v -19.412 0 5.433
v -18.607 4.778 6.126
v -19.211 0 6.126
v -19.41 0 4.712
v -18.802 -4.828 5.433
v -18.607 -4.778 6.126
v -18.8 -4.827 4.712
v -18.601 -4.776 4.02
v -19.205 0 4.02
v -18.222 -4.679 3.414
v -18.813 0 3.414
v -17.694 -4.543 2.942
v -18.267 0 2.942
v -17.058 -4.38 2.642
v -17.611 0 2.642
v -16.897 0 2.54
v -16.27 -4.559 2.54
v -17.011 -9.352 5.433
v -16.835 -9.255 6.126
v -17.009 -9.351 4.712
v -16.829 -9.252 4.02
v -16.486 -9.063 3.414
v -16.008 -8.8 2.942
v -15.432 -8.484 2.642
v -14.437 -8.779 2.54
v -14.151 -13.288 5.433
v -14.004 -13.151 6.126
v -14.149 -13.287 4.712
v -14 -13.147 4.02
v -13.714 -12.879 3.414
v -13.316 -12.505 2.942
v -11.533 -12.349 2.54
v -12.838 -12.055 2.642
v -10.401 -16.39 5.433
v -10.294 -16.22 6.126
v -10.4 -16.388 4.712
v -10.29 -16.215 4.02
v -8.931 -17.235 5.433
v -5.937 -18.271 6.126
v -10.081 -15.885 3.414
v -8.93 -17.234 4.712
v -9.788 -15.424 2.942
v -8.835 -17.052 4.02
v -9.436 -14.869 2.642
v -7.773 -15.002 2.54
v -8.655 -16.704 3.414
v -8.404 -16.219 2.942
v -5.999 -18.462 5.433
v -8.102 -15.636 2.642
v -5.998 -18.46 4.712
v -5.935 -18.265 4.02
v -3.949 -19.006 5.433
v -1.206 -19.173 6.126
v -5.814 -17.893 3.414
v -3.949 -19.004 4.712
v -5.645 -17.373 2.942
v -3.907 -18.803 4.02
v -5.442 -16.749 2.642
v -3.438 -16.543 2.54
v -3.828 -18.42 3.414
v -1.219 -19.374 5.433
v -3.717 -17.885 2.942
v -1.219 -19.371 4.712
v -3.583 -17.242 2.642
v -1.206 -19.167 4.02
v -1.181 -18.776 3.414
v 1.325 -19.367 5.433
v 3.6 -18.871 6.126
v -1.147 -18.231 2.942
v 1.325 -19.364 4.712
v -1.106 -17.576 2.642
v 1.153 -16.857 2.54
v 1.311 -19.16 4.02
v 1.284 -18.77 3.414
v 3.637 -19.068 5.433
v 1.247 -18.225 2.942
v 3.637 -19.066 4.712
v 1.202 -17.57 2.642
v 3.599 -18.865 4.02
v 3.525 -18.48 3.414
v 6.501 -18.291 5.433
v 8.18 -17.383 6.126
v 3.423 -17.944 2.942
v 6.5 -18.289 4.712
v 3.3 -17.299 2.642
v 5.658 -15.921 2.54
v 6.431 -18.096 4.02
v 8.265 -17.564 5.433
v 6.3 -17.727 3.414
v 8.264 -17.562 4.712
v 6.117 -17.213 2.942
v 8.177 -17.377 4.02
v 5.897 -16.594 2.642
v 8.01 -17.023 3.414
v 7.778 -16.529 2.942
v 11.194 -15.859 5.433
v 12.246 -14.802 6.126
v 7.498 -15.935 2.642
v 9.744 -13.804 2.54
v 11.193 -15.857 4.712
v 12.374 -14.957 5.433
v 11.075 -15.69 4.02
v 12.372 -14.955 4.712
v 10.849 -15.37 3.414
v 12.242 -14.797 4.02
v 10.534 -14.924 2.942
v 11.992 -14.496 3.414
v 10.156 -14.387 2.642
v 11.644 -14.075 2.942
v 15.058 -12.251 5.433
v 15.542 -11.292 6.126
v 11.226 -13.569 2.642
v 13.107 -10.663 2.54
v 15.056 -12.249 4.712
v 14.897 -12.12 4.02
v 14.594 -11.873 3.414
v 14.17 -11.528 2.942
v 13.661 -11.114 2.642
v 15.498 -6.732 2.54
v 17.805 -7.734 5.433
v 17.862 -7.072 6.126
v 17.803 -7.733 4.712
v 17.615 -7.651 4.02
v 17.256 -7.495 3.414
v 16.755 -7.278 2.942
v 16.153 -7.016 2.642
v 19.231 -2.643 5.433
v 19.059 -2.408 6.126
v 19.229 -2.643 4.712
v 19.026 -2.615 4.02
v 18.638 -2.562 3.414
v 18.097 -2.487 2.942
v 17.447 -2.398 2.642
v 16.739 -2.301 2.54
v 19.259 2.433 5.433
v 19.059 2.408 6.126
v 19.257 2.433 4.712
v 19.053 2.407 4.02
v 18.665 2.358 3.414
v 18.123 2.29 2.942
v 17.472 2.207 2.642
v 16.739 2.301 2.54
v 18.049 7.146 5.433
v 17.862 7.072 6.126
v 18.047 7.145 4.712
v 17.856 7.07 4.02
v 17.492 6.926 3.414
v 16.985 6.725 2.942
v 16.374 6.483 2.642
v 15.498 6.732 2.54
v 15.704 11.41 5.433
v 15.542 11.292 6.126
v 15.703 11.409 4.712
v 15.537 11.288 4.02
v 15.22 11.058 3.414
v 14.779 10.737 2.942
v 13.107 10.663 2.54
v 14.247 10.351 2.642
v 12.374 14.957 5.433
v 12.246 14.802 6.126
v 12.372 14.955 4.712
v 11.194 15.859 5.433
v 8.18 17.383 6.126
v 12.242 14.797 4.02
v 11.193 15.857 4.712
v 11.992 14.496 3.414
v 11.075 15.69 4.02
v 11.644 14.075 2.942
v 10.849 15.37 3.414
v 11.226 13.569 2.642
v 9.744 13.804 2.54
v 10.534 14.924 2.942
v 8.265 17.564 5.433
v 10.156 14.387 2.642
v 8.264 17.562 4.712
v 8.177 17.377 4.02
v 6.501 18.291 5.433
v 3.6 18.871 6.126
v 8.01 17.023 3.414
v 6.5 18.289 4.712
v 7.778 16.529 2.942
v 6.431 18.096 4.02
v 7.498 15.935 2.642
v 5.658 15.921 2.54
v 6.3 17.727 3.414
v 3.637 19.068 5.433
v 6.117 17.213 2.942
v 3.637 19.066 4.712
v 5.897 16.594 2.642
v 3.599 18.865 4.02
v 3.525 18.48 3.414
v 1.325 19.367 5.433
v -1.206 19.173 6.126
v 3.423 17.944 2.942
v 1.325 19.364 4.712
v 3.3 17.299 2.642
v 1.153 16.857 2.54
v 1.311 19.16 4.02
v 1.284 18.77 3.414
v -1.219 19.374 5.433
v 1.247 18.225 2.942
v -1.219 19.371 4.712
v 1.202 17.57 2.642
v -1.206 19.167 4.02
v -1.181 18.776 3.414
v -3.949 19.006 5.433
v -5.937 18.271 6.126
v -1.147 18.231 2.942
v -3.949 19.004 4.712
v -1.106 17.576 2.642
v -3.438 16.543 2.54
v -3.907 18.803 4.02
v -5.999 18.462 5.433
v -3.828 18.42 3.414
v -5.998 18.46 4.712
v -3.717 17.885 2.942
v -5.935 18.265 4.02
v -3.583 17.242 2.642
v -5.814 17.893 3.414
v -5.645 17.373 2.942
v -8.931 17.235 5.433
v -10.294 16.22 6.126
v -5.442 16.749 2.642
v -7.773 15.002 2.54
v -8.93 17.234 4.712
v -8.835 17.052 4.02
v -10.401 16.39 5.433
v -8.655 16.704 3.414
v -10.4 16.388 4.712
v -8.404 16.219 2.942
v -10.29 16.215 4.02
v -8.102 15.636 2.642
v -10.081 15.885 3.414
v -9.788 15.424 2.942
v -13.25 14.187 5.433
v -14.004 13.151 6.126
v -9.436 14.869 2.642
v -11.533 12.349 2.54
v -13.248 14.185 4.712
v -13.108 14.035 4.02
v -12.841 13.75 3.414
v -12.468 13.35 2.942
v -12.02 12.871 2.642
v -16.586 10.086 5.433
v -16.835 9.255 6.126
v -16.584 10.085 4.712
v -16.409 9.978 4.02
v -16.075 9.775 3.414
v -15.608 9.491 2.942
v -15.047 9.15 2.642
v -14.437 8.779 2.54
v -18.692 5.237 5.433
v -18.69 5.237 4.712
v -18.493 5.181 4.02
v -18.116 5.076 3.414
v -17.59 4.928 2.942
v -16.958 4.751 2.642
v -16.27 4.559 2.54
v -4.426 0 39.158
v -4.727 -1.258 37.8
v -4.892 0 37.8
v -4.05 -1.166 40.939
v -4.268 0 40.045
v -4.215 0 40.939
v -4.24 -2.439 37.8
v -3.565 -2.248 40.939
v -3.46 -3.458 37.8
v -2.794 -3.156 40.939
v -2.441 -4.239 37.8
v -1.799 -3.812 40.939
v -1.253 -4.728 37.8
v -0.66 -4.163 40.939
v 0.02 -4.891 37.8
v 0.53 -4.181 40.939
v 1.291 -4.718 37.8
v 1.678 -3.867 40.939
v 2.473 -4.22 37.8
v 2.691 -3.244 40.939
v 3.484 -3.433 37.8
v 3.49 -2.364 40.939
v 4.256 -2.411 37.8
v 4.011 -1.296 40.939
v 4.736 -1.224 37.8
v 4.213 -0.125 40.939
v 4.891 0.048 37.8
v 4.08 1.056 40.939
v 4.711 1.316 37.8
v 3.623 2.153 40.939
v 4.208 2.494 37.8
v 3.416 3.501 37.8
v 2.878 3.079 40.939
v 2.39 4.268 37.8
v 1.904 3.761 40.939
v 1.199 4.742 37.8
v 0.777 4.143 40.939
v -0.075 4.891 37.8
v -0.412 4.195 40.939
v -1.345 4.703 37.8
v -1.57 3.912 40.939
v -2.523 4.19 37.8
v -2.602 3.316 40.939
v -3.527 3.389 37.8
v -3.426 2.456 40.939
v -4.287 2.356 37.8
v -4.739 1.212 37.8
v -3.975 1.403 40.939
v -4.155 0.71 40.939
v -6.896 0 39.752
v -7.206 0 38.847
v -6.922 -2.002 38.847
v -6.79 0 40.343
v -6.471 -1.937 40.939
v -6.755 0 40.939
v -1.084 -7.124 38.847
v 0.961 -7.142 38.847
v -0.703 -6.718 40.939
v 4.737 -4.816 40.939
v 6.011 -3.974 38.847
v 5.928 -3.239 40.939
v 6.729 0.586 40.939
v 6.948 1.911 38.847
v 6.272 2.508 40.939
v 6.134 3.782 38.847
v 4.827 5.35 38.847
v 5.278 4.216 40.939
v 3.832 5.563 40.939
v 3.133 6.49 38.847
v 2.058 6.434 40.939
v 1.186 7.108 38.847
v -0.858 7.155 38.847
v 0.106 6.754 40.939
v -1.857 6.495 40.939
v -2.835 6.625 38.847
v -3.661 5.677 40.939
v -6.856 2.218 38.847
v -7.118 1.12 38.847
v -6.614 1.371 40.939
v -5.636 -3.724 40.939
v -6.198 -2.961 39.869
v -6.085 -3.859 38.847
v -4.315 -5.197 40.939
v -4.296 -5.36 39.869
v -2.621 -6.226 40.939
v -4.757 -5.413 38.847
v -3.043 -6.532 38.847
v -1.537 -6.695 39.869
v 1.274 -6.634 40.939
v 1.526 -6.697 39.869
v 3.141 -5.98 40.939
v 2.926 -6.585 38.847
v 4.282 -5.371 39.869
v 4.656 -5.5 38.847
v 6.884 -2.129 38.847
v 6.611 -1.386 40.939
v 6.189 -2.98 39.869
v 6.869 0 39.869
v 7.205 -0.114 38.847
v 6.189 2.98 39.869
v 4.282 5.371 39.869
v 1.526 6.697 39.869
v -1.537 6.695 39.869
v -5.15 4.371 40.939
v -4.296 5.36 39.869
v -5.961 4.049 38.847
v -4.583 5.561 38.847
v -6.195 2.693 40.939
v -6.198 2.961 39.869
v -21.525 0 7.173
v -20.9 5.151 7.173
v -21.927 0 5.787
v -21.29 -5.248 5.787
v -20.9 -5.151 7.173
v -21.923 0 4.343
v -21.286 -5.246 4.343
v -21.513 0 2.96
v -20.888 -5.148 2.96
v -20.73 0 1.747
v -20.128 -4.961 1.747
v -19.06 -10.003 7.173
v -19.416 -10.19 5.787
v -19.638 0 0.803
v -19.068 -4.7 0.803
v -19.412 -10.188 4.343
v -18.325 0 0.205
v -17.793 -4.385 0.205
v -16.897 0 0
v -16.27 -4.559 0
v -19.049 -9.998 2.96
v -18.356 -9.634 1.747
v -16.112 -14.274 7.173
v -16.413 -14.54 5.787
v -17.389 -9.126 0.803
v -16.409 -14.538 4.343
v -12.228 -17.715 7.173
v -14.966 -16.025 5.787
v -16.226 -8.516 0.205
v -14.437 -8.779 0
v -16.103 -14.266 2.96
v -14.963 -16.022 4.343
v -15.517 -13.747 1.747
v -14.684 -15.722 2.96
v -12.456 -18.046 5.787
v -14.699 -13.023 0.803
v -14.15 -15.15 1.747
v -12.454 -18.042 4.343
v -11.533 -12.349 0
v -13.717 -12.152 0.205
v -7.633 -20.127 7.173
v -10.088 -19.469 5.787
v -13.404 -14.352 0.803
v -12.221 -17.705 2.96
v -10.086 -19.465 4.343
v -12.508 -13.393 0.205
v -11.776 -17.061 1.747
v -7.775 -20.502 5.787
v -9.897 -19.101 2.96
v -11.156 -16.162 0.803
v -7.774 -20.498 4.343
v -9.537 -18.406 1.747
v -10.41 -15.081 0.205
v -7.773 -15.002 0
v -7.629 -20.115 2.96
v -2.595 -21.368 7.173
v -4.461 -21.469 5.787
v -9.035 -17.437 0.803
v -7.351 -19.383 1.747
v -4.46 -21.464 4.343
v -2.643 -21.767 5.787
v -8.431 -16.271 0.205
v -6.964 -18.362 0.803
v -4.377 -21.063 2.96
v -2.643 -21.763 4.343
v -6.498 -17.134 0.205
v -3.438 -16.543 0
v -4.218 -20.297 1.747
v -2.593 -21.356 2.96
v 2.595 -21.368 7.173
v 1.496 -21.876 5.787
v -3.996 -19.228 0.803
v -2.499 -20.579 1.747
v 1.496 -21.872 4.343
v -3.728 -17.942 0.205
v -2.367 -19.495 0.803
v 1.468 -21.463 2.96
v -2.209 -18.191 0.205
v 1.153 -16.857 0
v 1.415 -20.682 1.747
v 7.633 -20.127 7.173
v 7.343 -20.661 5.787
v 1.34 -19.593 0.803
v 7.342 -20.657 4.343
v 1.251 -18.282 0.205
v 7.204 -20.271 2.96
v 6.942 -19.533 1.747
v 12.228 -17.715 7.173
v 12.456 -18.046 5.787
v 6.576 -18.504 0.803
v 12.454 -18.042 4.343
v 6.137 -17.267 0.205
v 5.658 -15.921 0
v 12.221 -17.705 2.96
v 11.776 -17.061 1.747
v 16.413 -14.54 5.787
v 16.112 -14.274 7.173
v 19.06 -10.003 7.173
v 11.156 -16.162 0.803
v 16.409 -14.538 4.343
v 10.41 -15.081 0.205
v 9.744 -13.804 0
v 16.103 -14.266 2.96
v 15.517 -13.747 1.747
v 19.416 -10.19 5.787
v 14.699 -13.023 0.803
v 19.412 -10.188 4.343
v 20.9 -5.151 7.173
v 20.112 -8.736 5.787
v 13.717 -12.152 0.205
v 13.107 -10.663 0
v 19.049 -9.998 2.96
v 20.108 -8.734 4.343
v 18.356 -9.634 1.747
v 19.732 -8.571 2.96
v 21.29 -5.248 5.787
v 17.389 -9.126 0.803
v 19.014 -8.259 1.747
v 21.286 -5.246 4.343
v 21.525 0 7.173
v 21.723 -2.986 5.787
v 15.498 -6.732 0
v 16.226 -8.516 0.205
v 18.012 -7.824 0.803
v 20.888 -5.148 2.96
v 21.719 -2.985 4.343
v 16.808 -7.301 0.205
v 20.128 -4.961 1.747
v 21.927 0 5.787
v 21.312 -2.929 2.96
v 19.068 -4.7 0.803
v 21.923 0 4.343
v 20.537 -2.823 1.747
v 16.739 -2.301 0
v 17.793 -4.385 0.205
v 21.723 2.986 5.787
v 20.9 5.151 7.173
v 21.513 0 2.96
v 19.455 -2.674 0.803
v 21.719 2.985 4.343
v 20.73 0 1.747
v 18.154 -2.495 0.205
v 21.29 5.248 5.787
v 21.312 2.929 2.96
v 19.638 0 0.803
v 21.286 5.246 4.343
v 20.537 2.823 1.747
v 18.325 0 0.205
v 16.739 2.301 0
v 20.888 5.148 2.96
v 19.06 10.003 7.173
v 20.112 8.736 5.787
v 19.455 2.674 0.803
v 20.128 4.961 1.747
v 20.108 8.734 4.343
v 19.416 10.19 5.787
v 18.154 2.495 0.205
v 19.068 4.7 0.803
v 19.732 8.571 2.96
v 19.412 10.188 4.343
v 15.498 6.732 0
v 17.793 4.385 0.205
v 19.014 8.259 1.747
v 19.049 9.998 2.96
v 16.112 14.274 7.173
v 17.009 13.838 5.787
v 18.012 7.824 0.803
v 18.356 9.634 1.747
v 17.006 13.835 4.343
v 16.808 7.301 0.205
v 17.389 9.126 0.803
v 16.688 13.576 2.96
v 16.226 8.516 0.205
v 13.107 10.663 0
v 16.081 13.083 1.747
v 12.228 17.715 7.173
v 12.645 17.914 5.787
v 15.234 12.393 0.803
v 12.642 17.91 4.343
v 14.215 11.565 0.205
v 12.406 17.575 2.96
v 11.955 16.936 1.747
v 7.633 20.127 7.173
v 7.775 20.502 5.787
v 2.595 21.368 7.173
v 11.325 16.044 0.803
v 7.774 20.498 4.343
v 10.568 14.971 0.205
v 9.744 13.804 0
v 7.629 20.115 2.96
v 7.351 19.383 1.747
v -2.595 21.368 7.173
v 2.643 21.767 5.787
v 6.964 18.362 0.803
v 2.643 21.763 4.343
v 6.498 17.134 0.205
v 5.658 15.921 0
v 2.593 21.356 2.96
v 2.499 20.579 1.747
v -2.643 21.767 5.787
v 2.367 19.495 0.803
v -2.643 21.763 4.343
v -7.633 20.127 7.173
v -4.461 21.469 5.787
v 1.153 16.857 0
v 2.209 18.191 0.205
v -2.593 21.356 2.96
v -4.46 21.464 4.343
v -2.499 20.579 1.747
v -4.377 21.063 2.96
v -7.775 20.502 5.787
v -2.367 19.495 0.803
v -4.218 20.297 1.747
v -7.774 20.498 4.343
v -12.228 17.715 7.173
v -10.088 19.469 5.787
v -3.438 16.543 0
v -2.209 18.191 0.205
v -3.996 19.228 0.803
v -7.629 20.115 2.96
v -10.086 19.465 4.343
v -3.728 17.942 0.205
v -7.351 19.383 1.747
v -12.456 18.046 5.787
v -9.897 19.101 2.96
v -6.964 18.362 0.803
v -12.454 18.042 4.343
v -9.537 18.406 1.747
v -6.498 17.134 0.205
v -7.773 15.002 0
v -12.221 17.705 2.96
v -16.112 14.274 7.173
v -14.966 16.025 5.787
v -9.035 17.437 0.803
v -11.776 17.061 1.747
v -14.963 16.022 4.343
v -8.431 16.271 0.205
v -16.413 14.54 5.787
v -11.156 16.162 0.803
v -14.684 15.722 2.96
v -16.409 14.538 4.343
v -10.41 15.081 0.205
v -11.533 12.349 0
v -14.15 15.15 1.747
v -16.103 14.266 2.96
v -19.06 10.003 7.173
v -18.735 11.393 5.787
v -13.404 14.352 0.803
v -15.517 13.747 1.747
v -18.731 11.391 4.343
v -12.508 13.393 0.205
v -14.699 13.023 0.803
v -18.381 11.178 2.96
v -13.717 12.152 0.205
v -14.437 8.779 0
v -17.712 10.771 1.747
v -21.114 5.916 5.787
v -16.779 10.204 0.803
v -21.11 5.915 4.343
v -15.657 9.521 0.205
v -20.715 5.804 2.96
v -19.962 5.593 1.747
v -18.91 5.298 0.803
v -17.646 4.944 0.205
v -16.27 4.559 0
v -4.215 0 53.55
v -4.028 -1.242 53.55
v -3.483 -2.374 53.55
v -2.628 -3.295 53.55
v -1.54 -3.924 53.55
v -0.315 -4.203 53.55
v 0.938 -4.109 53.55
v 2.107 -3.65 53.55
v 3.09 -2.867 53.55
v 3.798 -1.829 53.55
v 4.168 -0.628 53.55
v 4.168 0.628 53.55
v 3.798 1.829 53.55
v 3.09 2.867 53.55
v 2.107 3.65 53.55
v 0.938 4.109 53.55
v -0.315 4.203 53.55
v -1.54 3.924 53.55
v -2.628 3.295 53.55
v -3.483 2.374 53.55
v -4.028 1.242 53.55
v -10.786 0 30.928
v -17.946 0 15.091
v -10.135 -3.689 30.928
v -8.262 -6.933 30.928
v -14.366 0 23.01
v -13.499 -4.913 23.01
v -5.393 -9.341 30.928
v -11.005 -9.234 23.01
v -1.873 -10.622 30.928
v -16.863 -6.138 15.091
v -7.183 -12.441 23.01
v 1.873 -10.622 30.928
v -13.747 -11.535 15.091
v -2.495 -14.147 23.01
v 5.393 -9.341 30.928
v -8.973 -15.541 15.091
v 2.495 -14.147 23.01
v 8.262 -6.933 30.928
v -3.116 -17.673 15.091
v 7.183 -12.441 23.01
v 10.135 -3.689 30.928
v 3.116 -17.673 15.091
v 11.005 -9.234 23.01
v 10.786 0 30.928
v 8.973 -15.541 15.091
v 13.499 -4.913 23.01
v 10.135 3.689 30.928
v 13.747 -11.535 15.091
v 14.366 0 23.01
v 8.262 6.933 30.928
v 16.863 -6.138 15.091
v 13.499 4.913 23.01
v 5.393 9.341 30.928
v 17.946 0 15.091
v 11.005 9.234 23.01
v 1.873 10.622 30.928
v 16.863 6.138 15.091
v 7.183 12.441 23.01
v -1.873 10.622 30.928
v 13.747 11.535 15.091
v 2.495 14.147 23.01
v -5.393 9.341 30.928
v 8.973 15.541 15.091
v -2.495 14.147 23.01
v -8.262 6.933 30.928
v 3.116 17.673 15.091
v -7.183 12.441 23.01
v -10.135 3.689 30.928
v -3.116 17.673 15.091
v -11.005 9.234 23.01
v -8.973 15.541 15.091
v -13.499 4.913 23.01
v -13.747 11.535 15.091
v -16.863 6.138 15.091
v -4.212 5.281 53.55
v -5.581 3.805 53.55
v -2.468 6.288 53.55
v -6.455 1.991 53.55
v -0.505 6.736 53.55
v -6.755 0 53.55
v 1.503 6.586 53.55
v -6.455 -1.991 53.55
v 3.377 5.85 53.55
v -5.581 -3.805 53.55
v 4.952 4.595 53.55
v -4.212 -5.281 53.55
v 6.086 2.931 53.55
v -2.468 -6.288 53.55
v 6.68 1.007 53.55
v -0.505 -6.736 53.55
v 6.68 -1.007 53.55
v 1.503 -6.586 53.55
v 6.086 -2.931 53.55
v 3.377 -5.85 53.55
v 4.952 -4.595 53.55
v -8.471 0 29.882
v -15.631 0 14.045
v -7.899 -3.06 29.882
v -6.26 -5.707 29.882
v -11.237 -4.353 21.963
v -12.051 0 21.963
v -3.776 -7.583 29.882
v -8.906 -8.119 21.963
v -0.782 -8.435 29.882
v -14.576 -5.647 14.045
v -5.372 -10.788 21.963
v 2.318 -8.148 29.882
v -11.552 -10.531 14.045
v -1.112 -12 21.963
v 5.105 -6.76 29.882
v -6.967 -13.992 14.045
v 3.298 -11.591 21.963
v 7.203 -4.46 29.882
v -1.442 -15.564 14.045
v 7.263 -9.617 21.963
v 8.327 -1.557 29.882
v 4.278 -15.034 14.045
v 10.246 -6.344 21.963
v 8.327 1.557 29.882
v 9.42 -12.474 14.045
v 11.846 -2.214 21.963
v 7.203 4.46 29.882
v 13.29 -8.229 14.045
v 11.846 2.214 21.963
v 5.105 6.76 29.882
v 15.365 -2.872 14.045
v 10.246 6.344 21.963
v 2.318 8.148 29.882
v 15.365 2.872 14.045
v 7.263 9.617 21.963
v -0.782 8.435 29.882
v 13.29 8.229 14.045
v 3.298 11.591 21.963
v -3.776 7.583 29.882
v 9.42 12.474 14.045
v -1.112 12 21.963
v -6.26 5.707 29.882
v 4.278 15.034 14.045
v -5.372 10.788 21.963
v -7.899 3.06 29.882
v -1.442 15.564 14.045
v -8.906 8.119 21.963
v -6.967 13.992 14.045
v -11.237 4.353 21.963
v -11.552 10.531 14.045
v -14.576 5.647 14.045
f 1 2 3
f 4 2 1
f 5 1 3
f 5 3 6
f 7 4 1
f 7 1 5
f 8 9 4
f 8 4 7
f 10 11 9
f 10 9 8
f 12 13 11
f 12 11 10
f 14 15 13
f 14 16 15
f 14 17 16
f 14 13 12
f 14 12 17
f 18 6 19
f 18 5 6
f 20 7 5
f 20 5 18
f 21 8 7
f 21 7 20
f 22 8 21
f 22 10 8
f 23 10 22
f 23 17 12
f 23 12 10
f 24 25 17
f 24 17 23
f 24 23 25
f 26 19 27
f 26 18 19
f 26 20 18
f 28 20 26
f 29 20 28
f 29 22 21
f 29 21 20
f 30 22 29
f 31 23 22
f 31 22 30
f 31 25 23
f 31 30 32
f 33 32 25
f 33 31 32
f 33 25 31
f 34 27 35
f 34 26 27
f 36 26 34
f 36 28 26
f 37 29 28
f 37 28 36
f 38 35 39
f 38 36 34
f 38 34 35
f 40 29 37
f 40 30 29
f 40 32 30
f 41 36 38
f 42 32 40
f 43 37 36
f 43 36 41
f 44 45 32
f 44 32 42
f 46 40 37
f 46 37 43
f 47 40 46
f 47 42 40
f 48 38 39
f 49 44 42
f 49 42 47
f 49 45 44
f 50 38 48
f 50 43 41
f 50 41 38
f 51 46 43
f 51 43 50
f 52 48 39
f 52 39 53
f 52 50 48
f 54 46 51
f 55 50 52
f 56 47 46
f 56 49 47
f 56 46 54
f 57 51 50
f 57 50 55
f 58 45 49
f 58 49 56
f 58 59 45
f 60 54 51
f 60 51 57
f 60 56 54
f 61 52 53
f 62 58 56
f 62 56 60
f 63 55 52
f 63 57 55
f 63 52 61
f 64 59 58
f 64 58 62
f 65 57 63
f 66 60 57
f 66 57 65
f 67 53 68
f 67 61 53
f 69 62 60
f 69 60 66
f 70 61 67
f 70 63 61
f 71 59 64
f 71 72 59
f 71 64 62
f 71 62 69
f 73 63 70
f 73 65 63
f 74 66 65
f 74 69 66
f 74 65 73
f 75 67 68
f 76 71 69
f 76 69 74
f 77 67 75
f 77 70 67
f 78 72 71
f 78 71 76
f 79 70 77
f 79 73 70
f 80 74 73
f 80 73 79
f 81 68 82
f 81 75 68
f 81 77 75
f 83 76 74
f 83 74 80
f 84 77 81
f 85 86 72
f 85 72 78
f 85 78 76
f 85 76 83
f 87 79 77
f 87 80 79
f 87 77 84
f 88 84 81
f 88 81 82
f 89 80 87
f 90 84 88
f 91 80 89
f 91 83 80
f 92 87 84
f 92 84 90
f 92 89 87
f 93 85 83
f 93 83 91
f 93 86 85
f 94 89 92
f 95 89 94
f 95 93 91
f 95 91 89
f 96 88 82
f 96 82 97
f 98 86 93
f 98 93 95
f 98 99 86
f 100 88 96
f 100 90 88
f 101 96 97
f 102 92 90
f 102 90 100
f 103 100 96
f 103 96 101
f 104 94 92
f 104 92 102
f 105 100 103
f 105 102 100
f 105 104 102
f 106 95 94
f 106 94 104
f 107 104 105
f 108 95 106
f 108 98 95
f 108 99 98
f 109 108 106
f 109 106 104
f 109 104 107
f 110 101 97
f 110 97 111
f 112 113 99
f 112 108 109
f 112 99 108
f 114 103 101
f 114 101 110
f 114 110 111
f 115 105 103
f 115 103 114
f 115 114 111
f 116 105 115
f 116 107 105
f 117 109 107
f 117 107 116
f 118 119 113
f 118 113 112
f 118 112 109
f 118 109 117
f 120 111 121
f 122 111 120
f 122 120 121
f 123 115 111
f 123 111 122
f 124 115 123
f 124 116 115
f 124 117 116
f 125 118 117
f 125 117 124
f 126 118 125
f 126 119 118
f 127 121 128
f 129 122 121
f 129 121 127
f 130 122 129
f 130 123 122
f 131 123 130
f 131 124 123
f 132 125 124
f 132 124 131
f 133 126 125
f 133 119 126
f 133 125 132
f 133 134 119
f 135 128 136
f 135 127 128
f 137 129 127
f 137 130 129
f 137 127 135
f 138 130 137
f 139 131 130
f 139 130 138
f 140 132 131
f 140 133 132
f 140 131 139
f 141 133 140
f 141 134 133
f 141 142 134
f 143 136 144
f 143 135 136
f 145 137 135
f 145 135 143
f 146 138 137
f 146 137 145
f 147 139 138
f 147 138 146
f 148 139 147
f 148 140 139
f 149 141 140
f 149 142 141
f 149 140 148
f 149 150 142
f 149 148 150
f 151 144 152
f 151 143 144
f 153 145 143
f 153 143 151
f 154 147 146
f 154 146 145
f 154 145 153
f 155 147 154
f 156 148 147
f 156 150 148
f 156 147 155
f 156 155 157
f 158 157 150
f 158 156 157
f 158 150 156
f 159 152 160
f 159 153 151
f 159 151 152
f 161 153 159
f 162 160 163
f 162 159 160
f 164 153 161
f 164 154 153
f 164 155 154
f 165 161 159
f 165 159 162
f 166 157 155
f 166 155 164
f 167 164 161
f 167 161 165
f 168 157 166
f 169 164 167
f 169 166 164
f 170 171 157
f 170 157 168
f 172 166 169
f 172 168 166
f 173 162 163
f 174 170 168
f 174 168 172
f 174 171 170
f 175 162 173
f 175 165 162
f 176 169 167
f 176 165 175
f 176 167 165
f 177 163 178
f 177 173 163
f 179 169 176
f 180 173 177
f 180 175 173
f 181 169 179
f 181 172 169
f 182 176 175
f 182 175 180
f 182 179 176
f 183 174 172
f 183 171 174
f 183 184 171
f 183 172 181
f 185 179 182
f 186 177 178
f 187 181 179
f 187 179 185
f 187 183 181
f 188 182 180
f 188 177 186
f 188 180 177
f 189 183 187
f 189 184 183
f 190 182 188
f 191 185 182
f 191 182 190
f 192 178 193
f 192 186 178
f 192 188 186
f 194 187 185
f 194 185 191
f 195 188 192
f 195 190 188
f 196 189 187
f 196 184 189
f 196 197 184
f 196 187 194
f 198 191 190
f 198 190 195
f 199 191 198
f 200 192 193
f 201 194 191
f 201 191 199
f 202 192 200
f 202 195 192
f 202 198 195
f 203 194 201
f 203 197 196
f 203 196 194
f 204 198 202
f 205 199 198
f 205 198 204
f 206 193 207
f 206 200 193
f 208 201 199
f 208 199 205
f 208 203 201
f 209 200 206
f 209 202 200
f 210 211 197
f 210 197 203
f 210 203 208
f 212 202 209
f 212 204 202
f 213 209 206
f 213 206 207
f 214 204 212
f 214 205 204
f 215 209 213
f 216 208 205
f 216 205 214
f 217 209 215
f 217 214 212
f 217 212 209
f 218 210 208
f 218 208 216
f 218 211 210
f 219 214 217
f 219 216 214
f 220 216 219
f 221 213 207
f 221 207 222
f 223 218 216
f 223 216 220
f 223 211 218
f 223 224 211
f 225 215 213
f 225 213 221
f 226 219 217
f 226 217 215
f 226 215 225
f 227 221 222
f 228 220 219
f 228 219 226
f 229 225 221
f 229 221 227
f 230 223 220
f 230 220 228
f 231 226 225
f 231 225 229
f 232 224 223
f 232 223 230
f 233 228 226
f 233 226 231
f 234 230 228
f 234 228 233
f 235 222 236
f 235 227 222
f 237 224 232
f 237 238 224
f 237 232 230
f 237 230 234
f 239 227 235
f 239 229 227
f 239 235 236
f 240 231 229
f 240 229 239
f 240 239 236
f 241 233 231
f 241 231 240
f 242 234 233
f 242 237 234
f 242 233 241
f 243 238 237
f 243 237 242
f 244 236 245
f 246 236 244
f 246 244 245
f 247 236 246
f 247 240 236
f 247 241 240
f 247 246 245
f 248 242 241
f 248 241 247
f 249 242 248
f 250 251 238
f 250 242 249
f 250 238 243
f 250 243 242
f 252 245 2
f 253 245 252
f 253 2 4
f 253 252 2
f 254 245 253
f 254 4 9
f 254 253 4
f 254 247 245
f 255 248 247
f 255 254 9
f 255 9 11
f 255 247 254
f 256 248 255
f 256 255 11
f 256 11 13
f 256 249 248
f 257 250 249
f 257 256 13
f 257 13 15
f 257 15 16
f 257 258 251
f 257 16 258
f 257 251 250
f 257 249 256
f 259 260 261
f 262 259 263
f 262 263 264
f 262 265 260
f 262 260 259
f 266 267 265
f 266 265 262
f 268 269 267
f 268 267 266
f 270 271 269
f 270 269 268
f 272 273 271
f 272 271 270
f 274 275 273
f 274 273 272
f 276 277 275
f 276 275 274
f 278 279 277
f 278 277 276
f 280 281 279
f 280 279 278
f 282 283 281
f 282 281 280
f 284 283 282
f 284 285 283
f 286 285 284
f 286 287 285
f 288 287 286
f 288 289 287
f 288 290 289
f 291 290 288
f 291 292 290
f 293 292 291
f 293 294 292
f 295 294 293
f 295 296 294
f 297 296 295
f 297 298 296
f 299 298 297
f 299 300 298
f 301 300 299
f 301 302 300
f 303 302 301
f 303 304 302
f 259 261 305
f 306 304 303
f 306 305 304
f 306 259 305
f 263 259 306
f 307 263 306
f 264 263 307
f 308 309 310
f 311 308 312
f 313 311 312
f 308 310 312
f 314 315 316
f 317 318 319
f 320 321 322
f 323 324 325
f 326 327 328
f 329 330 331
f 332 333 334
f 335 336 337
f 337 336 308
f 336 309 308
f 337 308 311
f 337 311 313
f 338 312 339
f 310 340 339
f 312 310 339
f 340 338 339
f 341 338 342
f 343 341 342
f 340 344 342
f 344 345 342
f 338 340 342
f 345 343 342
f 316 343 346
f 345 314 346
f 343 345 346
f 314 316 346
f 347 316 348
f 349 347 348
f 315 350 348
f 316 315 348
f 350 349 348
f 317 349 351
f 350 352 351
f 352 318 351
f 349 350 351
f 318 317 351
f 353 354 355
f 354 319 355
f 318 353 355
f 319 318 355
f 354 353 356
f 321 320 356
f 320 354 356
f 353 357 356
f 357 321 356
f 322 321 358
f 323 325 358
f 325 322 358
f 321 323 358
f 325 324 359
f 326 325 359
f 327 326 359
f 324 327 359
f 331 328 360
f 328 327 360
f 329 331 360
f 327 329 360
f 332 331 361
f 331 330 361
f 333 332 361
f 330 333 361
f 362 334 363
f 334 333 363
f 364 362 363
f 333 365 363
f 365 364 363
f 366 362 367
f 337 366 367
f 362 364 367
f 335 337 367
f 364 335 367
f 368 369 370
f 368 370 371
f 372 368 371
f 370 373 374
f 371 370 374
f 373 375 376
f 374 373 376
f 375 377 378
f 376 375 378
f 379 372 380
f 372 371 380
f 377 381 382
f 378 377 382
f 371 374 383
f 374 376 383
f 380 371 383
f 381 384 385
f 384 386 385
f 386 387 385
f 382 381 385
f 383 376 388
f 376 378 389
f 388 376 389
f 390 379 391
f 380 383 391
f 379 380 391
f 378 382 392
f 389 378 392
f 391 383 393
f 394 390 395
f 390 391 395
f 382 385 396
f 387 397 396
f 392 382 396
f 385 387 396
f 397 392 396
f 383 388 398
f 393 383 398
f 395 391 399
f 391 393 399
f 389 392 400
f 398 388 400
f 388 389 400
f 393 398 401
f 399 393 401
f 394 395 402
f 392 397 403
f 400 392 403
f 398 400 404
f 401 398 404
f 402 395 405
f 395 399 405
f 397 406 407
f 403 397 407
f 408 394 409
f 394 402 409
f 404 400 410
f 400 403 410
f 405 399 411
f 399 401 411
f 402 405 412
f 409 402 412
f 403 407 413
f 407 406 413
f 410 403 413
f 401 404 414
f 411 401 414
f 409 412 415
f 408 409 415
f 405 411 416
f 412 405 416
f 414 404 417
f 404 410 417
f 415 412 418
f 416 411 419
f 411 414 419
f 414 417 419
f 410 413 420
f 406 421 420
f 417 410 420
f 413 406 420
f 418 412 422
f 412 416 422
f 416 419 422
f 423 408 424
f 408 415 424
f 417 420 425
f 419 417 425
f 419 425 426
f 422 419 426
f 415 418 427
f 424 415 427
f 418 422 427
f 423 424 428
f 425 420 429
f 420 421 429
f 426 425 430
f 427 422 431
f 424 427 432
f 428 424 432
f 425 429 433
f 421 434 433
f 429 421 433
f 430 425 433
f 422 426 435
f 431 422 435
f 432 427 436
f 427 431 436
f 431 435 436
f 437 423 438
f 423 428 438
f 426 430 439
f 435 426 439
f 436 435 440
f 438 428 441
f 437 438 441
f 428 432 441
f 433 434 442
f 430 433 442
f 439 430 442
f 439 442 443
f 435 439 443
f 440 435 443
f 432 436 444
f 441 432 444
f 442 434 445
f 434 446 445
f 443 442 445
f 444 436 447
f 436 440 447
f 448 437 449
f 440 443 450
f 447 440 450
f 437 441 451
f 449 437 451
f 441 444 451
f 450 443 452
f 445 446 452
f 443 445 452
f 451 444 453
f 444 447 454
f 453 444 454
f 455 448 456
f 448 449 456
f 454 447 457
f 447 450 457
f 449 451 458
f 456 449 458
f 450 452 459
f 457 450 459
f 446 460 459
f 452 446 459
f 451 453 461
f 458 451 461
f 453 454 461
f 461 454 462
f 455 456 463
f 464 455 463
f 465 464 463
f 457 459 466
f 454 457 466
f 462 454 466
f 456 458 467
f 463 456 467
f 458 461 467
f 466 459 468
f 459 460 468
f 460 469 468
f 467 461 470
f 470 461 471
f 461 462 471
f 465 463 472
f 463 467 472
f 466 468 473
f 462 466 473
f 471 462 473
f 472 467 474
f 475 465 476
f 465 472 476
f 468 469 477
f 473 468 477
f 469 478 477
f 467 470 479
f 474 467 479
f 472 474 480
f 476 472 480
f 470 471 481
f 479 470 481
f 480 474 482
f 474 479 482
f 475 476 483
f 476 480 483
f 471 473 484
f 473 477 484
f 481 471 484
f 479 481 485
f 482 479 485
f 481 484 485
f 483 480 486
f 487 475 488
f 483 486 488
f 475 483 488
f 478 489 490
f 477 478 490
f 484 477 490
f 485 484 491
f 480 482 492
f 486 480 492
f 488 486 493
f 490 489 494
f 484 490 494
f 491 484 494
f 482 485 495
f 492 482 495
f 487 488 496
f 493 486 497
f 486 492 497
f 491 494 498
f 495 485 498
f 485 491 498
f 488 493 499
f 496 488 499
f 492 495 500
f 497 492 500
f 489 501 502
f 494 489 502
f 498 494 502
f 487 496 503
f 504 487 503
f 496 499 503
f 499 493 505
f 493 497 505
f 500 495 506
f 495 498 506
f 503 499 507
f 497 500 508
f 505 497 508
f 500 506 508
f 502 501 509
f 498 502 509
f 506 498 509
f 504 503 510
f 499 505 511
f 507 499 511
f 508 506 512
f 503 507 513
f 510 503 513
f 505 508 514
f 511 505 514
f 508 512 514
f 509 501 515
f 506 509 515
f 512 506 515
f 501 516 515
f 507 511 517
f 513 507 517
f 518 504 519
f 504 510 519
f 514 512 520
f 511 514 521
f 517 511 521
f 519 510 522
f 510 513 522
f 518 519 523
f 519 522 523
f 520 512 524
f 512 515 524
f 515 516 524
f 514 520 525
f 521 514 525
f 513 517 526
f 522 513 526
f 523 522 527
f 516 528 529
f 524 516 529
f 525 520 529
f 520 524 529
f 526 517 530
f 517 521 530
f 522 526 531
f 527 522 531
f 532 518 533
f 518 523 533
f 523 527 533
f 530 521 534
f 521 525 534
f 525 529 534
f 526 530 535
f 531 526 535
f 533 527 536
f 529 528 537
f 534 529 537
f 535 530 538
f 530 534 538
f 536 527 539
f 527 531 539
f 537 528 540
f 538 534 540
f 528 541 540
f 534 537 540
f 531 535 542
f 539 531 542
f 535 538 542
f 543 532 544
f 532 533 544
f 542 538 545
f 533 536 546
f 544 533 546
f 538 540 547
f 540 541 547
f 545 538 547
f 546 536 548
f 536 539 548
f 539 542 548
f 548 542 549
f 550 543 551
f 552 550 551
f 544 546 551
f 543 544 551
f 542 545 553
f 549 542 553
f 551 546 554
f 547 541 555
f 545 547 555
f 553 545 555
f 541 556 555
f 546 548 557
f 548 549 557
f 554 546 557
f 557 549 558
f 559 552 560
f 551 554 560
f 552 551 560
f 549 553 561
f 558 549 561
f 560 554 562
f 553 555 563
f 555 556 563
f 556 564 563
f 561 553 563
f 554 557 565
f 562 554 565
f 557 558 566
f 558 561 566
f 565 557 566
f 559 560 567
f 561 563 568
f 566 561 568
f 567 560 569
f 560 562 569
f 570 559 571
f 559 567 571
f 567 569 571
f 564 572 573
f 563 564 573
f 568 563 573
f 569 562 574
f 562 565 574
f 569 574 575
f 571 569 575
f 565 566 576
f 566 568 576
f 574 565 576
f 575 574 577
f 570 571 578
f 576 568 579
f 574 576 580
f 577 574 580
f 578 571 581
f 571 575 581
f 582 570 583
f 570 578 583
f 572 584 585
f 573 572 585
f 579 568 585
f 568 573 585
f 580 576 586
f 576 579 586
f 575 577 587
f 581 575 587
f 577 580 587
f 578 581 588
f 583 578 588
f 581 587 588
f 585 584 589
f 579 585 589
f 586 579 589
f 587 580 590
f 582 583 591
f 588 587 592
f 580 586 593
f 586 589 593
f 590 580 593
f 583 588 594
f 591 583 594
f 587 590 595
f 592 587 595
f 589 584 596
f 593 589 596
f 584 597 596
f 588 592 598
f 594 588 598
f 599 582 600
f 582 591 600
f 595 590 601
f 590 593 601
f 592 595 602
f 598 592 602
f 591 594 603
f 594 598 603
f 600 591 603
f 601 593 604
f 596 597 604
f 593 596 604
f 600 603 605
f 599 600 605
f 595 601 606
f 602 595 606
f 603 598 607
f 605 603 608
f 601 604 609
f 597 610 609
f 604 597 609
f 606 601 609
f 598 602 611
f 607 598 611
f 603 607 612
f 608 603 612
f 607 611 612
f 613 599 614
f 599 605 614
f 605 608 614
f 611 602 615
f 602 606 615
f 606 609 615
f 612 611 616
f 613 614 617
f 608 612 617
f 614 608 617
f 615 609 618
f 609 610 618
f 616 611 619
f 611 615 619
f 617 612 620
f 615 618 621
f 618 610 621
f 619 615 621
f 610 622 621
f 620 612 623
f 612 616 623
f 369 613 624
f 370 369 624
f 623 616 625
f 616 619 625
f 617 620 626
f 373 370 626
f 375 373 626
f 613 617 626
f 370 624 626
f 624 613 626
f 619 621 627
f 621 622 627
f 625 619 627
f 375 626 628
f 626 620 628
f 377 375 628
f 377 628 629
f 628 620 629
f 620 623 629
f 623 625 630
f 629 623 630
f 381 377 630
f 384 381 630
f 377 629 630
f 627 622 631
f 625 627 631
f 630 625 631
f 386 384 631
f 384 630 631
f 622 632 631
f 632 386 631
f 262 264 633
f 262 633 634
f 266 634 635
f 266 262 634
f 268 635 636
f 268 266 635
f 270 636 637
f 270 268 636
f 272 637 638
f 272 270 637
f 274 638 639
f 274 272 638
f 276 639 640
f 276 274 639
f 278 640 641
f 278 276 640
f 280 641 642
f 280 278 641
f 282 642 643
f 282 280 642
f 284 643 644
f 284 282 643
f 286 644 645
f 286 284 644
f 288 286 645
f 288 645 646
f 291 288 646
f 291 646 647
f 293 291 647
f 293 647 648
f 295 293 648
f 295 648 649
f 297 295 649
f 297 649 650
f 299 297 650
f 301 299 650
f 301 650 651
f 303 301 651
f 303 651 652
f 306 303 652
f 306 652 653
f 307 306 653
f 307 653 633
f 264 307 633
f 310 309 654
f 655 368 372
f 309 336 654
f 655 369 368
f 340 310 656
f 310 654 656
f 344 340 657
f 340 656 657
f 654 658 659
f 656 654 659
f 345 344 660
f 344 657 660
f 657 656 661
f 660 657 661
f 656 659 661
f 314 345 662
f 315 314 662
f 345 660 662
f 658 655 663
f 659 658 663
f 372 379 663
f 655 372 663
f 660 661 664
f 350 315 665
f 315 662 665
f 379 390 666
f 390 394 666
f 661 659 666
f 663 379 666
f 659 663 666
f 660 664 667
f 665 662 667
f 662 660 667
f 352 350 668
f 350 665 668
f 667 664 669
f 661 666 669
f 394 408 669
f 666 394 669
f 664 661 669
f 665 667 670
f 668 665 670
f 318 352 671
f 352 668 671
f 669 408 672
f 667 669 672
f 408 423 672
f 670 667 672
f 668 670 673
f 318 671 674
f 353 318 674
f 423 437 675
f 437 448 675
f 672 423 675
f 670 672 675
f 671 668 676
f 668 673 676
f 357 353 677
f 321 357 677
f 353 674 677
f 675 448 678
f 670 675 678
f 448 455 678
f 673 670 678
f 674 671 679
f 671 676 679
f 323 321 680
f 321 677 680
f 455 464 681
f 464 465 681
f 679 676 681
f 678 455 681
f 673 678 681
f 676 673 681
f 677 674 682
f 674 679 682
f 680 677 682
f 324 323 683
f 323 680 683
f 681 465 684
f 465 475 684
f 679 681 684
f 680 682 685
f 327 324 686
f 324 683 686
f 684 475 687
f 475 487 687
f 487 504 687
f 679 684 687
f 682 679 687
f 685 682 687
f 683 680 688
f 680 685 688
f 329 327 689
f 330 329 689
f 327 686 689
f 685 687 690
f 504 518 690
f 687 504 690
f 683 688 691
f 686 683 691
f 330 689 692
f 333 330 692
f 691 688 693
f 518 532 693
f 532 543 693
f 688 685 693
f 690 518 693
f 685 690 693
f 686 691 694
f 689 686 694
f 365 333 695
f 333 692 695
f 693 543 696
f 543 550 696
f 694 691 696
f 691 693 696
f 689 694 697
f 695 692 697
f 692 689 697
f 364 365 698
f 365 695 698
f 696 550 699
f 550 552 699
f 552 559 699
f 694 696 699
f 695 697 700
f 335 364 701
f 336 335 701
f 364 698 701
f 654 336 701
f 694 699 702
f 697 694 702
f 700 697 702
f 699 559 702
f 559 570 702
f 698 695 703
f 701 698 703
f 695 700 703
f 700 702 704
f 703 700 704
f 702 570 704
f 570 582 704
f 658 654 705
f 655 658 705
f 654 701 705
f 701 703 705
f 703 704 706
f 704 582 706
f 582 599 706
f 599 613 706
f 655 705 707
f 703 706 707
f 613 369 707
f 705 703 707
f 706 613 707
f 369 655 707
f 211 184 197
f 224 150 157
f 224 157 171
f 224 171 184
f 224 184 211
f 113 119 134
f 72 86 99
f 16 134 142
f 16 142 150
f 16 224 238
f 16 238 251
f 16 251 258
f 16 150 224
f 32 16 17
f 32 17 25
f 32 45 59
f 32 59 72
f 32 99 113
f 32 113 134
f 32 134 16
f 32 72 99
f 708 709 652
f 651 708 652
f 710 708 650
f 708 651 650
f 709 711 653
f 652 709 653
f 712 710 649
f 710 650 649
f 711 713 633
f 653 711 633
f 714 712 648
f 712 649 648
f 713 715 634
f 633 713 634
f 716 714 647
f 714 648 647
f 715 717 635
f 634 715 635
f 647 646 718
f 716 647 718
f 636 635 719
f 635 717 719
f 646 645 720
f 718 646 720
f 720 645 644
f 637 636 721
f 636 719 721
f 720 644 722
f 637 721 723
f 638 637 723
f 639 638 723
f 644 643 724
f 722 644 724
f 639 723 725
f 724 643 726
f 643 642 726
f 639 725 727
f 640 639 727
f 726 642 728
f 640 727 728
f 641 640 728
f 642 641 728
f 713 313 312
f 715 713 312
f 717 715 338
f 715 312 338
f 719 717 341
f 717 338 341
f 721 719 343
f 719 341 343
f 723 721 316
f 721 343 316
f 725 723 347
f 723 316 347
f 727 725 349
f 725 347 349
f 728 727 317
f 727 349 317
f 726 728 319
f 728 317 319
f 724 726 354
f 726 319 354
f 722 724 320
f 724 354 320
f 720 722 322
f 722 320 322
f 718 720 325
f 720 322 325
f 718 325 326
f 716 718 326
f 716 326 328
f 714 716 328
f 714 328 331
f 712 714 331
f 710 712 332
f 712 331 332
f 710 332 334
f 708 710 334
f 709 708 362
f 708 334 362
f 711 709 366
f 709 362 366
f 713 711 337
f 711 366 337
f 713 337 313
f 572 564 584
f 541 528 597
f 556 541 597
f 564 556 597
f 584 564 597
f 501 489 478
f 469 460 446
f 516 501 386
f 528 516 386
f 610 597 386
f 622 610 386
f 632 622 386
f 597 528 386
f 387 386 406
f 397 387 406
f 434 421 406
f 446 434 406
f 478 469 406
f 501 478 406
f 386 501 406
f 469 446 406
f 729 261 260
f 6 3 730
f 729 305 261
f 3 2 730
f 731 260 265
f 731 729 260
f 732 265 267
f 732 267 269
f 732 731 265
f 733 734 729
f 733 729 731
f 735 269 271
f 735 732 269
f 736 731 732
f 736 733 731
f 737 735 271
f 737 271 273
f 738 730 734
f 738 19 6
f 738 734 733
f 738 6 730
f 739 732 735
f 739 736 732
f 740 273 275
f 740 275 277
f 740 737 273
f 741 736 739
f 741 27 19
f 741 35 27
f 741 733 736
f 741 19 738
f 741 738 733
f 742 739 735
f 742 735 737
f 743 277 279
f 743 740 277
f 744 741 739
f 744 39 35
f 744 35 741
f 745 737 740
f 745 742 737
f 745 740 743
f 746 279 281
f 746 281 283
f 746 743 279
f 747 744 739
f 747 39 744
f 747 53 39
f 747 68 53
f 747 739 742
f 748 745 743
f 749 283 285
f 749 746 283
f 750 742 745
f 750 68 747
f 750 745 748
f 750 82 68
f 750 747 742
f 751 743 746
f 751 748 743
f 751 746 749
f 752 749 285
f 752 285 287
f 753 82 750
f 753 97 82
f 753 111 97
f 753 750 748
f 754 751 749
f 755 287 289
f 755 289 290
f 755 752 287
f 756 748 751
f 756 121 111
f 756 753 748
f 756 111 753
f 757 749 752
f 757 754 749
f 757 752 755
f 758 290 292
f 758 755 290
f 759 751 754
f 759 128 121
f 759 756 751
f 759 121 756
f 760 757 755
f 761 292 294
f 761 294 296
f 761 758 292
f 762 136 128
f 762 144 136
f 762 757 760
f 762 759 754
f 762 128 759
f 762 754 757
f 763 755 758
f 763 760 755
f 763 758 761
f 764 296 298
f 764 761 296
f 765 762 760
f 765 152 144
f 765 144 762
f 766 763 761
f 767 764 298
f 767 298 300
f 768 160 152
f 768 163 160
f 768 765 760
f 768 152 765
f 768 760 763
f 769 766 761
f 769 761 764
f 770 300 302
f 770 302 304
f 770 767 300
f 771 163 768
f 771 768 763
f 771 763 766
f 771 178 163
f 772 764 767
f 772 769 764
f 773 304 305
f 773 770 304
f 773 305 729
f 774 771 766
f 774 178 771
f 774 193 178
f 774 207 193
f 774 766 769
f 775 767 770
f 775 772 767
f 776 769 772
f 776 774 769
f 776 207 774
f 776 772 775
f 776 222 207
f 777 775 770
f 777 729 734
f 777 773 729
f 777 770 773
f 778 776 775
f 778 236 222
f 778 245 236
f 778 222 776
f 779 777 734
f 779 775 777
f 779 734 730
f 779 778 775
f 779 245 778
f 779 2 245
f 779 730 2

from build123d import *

# Parameters (mm, degrees)
F2_R = 5.08
F3_T = -2.54


with BuildPart() as f1:
    # F0 (on Front) → F1 (revolve)
    with BuildSketch(Plane.XZ):
        Polygon((-6.754948, 39.844375), (-24.768133, 0), (0, 0), (0, 53.550061), (-6.754948, 53.550061), align=None)
    revolve(axis=Axis((0, 0, 26.77503), (0, 0, 1)))

    # F2
    f2_edges = [f1.edges().sort_by_distance(p)[0] for p in [
        (6.754948, 0, 39.844375),
        (24.768133, 0, 0),
        (-15.76154, 0, 19.922188),
    ]]
    fillet(f2_edges, radius=F2_R)

    # F3
    f3_openings = [f1.faces().sort_by_distance(p)[0] for p in [
        (0, 0, 53.550061),
    ]]
    offset(amount=F3_T, openings=f3_openings)


solid = f1.part
